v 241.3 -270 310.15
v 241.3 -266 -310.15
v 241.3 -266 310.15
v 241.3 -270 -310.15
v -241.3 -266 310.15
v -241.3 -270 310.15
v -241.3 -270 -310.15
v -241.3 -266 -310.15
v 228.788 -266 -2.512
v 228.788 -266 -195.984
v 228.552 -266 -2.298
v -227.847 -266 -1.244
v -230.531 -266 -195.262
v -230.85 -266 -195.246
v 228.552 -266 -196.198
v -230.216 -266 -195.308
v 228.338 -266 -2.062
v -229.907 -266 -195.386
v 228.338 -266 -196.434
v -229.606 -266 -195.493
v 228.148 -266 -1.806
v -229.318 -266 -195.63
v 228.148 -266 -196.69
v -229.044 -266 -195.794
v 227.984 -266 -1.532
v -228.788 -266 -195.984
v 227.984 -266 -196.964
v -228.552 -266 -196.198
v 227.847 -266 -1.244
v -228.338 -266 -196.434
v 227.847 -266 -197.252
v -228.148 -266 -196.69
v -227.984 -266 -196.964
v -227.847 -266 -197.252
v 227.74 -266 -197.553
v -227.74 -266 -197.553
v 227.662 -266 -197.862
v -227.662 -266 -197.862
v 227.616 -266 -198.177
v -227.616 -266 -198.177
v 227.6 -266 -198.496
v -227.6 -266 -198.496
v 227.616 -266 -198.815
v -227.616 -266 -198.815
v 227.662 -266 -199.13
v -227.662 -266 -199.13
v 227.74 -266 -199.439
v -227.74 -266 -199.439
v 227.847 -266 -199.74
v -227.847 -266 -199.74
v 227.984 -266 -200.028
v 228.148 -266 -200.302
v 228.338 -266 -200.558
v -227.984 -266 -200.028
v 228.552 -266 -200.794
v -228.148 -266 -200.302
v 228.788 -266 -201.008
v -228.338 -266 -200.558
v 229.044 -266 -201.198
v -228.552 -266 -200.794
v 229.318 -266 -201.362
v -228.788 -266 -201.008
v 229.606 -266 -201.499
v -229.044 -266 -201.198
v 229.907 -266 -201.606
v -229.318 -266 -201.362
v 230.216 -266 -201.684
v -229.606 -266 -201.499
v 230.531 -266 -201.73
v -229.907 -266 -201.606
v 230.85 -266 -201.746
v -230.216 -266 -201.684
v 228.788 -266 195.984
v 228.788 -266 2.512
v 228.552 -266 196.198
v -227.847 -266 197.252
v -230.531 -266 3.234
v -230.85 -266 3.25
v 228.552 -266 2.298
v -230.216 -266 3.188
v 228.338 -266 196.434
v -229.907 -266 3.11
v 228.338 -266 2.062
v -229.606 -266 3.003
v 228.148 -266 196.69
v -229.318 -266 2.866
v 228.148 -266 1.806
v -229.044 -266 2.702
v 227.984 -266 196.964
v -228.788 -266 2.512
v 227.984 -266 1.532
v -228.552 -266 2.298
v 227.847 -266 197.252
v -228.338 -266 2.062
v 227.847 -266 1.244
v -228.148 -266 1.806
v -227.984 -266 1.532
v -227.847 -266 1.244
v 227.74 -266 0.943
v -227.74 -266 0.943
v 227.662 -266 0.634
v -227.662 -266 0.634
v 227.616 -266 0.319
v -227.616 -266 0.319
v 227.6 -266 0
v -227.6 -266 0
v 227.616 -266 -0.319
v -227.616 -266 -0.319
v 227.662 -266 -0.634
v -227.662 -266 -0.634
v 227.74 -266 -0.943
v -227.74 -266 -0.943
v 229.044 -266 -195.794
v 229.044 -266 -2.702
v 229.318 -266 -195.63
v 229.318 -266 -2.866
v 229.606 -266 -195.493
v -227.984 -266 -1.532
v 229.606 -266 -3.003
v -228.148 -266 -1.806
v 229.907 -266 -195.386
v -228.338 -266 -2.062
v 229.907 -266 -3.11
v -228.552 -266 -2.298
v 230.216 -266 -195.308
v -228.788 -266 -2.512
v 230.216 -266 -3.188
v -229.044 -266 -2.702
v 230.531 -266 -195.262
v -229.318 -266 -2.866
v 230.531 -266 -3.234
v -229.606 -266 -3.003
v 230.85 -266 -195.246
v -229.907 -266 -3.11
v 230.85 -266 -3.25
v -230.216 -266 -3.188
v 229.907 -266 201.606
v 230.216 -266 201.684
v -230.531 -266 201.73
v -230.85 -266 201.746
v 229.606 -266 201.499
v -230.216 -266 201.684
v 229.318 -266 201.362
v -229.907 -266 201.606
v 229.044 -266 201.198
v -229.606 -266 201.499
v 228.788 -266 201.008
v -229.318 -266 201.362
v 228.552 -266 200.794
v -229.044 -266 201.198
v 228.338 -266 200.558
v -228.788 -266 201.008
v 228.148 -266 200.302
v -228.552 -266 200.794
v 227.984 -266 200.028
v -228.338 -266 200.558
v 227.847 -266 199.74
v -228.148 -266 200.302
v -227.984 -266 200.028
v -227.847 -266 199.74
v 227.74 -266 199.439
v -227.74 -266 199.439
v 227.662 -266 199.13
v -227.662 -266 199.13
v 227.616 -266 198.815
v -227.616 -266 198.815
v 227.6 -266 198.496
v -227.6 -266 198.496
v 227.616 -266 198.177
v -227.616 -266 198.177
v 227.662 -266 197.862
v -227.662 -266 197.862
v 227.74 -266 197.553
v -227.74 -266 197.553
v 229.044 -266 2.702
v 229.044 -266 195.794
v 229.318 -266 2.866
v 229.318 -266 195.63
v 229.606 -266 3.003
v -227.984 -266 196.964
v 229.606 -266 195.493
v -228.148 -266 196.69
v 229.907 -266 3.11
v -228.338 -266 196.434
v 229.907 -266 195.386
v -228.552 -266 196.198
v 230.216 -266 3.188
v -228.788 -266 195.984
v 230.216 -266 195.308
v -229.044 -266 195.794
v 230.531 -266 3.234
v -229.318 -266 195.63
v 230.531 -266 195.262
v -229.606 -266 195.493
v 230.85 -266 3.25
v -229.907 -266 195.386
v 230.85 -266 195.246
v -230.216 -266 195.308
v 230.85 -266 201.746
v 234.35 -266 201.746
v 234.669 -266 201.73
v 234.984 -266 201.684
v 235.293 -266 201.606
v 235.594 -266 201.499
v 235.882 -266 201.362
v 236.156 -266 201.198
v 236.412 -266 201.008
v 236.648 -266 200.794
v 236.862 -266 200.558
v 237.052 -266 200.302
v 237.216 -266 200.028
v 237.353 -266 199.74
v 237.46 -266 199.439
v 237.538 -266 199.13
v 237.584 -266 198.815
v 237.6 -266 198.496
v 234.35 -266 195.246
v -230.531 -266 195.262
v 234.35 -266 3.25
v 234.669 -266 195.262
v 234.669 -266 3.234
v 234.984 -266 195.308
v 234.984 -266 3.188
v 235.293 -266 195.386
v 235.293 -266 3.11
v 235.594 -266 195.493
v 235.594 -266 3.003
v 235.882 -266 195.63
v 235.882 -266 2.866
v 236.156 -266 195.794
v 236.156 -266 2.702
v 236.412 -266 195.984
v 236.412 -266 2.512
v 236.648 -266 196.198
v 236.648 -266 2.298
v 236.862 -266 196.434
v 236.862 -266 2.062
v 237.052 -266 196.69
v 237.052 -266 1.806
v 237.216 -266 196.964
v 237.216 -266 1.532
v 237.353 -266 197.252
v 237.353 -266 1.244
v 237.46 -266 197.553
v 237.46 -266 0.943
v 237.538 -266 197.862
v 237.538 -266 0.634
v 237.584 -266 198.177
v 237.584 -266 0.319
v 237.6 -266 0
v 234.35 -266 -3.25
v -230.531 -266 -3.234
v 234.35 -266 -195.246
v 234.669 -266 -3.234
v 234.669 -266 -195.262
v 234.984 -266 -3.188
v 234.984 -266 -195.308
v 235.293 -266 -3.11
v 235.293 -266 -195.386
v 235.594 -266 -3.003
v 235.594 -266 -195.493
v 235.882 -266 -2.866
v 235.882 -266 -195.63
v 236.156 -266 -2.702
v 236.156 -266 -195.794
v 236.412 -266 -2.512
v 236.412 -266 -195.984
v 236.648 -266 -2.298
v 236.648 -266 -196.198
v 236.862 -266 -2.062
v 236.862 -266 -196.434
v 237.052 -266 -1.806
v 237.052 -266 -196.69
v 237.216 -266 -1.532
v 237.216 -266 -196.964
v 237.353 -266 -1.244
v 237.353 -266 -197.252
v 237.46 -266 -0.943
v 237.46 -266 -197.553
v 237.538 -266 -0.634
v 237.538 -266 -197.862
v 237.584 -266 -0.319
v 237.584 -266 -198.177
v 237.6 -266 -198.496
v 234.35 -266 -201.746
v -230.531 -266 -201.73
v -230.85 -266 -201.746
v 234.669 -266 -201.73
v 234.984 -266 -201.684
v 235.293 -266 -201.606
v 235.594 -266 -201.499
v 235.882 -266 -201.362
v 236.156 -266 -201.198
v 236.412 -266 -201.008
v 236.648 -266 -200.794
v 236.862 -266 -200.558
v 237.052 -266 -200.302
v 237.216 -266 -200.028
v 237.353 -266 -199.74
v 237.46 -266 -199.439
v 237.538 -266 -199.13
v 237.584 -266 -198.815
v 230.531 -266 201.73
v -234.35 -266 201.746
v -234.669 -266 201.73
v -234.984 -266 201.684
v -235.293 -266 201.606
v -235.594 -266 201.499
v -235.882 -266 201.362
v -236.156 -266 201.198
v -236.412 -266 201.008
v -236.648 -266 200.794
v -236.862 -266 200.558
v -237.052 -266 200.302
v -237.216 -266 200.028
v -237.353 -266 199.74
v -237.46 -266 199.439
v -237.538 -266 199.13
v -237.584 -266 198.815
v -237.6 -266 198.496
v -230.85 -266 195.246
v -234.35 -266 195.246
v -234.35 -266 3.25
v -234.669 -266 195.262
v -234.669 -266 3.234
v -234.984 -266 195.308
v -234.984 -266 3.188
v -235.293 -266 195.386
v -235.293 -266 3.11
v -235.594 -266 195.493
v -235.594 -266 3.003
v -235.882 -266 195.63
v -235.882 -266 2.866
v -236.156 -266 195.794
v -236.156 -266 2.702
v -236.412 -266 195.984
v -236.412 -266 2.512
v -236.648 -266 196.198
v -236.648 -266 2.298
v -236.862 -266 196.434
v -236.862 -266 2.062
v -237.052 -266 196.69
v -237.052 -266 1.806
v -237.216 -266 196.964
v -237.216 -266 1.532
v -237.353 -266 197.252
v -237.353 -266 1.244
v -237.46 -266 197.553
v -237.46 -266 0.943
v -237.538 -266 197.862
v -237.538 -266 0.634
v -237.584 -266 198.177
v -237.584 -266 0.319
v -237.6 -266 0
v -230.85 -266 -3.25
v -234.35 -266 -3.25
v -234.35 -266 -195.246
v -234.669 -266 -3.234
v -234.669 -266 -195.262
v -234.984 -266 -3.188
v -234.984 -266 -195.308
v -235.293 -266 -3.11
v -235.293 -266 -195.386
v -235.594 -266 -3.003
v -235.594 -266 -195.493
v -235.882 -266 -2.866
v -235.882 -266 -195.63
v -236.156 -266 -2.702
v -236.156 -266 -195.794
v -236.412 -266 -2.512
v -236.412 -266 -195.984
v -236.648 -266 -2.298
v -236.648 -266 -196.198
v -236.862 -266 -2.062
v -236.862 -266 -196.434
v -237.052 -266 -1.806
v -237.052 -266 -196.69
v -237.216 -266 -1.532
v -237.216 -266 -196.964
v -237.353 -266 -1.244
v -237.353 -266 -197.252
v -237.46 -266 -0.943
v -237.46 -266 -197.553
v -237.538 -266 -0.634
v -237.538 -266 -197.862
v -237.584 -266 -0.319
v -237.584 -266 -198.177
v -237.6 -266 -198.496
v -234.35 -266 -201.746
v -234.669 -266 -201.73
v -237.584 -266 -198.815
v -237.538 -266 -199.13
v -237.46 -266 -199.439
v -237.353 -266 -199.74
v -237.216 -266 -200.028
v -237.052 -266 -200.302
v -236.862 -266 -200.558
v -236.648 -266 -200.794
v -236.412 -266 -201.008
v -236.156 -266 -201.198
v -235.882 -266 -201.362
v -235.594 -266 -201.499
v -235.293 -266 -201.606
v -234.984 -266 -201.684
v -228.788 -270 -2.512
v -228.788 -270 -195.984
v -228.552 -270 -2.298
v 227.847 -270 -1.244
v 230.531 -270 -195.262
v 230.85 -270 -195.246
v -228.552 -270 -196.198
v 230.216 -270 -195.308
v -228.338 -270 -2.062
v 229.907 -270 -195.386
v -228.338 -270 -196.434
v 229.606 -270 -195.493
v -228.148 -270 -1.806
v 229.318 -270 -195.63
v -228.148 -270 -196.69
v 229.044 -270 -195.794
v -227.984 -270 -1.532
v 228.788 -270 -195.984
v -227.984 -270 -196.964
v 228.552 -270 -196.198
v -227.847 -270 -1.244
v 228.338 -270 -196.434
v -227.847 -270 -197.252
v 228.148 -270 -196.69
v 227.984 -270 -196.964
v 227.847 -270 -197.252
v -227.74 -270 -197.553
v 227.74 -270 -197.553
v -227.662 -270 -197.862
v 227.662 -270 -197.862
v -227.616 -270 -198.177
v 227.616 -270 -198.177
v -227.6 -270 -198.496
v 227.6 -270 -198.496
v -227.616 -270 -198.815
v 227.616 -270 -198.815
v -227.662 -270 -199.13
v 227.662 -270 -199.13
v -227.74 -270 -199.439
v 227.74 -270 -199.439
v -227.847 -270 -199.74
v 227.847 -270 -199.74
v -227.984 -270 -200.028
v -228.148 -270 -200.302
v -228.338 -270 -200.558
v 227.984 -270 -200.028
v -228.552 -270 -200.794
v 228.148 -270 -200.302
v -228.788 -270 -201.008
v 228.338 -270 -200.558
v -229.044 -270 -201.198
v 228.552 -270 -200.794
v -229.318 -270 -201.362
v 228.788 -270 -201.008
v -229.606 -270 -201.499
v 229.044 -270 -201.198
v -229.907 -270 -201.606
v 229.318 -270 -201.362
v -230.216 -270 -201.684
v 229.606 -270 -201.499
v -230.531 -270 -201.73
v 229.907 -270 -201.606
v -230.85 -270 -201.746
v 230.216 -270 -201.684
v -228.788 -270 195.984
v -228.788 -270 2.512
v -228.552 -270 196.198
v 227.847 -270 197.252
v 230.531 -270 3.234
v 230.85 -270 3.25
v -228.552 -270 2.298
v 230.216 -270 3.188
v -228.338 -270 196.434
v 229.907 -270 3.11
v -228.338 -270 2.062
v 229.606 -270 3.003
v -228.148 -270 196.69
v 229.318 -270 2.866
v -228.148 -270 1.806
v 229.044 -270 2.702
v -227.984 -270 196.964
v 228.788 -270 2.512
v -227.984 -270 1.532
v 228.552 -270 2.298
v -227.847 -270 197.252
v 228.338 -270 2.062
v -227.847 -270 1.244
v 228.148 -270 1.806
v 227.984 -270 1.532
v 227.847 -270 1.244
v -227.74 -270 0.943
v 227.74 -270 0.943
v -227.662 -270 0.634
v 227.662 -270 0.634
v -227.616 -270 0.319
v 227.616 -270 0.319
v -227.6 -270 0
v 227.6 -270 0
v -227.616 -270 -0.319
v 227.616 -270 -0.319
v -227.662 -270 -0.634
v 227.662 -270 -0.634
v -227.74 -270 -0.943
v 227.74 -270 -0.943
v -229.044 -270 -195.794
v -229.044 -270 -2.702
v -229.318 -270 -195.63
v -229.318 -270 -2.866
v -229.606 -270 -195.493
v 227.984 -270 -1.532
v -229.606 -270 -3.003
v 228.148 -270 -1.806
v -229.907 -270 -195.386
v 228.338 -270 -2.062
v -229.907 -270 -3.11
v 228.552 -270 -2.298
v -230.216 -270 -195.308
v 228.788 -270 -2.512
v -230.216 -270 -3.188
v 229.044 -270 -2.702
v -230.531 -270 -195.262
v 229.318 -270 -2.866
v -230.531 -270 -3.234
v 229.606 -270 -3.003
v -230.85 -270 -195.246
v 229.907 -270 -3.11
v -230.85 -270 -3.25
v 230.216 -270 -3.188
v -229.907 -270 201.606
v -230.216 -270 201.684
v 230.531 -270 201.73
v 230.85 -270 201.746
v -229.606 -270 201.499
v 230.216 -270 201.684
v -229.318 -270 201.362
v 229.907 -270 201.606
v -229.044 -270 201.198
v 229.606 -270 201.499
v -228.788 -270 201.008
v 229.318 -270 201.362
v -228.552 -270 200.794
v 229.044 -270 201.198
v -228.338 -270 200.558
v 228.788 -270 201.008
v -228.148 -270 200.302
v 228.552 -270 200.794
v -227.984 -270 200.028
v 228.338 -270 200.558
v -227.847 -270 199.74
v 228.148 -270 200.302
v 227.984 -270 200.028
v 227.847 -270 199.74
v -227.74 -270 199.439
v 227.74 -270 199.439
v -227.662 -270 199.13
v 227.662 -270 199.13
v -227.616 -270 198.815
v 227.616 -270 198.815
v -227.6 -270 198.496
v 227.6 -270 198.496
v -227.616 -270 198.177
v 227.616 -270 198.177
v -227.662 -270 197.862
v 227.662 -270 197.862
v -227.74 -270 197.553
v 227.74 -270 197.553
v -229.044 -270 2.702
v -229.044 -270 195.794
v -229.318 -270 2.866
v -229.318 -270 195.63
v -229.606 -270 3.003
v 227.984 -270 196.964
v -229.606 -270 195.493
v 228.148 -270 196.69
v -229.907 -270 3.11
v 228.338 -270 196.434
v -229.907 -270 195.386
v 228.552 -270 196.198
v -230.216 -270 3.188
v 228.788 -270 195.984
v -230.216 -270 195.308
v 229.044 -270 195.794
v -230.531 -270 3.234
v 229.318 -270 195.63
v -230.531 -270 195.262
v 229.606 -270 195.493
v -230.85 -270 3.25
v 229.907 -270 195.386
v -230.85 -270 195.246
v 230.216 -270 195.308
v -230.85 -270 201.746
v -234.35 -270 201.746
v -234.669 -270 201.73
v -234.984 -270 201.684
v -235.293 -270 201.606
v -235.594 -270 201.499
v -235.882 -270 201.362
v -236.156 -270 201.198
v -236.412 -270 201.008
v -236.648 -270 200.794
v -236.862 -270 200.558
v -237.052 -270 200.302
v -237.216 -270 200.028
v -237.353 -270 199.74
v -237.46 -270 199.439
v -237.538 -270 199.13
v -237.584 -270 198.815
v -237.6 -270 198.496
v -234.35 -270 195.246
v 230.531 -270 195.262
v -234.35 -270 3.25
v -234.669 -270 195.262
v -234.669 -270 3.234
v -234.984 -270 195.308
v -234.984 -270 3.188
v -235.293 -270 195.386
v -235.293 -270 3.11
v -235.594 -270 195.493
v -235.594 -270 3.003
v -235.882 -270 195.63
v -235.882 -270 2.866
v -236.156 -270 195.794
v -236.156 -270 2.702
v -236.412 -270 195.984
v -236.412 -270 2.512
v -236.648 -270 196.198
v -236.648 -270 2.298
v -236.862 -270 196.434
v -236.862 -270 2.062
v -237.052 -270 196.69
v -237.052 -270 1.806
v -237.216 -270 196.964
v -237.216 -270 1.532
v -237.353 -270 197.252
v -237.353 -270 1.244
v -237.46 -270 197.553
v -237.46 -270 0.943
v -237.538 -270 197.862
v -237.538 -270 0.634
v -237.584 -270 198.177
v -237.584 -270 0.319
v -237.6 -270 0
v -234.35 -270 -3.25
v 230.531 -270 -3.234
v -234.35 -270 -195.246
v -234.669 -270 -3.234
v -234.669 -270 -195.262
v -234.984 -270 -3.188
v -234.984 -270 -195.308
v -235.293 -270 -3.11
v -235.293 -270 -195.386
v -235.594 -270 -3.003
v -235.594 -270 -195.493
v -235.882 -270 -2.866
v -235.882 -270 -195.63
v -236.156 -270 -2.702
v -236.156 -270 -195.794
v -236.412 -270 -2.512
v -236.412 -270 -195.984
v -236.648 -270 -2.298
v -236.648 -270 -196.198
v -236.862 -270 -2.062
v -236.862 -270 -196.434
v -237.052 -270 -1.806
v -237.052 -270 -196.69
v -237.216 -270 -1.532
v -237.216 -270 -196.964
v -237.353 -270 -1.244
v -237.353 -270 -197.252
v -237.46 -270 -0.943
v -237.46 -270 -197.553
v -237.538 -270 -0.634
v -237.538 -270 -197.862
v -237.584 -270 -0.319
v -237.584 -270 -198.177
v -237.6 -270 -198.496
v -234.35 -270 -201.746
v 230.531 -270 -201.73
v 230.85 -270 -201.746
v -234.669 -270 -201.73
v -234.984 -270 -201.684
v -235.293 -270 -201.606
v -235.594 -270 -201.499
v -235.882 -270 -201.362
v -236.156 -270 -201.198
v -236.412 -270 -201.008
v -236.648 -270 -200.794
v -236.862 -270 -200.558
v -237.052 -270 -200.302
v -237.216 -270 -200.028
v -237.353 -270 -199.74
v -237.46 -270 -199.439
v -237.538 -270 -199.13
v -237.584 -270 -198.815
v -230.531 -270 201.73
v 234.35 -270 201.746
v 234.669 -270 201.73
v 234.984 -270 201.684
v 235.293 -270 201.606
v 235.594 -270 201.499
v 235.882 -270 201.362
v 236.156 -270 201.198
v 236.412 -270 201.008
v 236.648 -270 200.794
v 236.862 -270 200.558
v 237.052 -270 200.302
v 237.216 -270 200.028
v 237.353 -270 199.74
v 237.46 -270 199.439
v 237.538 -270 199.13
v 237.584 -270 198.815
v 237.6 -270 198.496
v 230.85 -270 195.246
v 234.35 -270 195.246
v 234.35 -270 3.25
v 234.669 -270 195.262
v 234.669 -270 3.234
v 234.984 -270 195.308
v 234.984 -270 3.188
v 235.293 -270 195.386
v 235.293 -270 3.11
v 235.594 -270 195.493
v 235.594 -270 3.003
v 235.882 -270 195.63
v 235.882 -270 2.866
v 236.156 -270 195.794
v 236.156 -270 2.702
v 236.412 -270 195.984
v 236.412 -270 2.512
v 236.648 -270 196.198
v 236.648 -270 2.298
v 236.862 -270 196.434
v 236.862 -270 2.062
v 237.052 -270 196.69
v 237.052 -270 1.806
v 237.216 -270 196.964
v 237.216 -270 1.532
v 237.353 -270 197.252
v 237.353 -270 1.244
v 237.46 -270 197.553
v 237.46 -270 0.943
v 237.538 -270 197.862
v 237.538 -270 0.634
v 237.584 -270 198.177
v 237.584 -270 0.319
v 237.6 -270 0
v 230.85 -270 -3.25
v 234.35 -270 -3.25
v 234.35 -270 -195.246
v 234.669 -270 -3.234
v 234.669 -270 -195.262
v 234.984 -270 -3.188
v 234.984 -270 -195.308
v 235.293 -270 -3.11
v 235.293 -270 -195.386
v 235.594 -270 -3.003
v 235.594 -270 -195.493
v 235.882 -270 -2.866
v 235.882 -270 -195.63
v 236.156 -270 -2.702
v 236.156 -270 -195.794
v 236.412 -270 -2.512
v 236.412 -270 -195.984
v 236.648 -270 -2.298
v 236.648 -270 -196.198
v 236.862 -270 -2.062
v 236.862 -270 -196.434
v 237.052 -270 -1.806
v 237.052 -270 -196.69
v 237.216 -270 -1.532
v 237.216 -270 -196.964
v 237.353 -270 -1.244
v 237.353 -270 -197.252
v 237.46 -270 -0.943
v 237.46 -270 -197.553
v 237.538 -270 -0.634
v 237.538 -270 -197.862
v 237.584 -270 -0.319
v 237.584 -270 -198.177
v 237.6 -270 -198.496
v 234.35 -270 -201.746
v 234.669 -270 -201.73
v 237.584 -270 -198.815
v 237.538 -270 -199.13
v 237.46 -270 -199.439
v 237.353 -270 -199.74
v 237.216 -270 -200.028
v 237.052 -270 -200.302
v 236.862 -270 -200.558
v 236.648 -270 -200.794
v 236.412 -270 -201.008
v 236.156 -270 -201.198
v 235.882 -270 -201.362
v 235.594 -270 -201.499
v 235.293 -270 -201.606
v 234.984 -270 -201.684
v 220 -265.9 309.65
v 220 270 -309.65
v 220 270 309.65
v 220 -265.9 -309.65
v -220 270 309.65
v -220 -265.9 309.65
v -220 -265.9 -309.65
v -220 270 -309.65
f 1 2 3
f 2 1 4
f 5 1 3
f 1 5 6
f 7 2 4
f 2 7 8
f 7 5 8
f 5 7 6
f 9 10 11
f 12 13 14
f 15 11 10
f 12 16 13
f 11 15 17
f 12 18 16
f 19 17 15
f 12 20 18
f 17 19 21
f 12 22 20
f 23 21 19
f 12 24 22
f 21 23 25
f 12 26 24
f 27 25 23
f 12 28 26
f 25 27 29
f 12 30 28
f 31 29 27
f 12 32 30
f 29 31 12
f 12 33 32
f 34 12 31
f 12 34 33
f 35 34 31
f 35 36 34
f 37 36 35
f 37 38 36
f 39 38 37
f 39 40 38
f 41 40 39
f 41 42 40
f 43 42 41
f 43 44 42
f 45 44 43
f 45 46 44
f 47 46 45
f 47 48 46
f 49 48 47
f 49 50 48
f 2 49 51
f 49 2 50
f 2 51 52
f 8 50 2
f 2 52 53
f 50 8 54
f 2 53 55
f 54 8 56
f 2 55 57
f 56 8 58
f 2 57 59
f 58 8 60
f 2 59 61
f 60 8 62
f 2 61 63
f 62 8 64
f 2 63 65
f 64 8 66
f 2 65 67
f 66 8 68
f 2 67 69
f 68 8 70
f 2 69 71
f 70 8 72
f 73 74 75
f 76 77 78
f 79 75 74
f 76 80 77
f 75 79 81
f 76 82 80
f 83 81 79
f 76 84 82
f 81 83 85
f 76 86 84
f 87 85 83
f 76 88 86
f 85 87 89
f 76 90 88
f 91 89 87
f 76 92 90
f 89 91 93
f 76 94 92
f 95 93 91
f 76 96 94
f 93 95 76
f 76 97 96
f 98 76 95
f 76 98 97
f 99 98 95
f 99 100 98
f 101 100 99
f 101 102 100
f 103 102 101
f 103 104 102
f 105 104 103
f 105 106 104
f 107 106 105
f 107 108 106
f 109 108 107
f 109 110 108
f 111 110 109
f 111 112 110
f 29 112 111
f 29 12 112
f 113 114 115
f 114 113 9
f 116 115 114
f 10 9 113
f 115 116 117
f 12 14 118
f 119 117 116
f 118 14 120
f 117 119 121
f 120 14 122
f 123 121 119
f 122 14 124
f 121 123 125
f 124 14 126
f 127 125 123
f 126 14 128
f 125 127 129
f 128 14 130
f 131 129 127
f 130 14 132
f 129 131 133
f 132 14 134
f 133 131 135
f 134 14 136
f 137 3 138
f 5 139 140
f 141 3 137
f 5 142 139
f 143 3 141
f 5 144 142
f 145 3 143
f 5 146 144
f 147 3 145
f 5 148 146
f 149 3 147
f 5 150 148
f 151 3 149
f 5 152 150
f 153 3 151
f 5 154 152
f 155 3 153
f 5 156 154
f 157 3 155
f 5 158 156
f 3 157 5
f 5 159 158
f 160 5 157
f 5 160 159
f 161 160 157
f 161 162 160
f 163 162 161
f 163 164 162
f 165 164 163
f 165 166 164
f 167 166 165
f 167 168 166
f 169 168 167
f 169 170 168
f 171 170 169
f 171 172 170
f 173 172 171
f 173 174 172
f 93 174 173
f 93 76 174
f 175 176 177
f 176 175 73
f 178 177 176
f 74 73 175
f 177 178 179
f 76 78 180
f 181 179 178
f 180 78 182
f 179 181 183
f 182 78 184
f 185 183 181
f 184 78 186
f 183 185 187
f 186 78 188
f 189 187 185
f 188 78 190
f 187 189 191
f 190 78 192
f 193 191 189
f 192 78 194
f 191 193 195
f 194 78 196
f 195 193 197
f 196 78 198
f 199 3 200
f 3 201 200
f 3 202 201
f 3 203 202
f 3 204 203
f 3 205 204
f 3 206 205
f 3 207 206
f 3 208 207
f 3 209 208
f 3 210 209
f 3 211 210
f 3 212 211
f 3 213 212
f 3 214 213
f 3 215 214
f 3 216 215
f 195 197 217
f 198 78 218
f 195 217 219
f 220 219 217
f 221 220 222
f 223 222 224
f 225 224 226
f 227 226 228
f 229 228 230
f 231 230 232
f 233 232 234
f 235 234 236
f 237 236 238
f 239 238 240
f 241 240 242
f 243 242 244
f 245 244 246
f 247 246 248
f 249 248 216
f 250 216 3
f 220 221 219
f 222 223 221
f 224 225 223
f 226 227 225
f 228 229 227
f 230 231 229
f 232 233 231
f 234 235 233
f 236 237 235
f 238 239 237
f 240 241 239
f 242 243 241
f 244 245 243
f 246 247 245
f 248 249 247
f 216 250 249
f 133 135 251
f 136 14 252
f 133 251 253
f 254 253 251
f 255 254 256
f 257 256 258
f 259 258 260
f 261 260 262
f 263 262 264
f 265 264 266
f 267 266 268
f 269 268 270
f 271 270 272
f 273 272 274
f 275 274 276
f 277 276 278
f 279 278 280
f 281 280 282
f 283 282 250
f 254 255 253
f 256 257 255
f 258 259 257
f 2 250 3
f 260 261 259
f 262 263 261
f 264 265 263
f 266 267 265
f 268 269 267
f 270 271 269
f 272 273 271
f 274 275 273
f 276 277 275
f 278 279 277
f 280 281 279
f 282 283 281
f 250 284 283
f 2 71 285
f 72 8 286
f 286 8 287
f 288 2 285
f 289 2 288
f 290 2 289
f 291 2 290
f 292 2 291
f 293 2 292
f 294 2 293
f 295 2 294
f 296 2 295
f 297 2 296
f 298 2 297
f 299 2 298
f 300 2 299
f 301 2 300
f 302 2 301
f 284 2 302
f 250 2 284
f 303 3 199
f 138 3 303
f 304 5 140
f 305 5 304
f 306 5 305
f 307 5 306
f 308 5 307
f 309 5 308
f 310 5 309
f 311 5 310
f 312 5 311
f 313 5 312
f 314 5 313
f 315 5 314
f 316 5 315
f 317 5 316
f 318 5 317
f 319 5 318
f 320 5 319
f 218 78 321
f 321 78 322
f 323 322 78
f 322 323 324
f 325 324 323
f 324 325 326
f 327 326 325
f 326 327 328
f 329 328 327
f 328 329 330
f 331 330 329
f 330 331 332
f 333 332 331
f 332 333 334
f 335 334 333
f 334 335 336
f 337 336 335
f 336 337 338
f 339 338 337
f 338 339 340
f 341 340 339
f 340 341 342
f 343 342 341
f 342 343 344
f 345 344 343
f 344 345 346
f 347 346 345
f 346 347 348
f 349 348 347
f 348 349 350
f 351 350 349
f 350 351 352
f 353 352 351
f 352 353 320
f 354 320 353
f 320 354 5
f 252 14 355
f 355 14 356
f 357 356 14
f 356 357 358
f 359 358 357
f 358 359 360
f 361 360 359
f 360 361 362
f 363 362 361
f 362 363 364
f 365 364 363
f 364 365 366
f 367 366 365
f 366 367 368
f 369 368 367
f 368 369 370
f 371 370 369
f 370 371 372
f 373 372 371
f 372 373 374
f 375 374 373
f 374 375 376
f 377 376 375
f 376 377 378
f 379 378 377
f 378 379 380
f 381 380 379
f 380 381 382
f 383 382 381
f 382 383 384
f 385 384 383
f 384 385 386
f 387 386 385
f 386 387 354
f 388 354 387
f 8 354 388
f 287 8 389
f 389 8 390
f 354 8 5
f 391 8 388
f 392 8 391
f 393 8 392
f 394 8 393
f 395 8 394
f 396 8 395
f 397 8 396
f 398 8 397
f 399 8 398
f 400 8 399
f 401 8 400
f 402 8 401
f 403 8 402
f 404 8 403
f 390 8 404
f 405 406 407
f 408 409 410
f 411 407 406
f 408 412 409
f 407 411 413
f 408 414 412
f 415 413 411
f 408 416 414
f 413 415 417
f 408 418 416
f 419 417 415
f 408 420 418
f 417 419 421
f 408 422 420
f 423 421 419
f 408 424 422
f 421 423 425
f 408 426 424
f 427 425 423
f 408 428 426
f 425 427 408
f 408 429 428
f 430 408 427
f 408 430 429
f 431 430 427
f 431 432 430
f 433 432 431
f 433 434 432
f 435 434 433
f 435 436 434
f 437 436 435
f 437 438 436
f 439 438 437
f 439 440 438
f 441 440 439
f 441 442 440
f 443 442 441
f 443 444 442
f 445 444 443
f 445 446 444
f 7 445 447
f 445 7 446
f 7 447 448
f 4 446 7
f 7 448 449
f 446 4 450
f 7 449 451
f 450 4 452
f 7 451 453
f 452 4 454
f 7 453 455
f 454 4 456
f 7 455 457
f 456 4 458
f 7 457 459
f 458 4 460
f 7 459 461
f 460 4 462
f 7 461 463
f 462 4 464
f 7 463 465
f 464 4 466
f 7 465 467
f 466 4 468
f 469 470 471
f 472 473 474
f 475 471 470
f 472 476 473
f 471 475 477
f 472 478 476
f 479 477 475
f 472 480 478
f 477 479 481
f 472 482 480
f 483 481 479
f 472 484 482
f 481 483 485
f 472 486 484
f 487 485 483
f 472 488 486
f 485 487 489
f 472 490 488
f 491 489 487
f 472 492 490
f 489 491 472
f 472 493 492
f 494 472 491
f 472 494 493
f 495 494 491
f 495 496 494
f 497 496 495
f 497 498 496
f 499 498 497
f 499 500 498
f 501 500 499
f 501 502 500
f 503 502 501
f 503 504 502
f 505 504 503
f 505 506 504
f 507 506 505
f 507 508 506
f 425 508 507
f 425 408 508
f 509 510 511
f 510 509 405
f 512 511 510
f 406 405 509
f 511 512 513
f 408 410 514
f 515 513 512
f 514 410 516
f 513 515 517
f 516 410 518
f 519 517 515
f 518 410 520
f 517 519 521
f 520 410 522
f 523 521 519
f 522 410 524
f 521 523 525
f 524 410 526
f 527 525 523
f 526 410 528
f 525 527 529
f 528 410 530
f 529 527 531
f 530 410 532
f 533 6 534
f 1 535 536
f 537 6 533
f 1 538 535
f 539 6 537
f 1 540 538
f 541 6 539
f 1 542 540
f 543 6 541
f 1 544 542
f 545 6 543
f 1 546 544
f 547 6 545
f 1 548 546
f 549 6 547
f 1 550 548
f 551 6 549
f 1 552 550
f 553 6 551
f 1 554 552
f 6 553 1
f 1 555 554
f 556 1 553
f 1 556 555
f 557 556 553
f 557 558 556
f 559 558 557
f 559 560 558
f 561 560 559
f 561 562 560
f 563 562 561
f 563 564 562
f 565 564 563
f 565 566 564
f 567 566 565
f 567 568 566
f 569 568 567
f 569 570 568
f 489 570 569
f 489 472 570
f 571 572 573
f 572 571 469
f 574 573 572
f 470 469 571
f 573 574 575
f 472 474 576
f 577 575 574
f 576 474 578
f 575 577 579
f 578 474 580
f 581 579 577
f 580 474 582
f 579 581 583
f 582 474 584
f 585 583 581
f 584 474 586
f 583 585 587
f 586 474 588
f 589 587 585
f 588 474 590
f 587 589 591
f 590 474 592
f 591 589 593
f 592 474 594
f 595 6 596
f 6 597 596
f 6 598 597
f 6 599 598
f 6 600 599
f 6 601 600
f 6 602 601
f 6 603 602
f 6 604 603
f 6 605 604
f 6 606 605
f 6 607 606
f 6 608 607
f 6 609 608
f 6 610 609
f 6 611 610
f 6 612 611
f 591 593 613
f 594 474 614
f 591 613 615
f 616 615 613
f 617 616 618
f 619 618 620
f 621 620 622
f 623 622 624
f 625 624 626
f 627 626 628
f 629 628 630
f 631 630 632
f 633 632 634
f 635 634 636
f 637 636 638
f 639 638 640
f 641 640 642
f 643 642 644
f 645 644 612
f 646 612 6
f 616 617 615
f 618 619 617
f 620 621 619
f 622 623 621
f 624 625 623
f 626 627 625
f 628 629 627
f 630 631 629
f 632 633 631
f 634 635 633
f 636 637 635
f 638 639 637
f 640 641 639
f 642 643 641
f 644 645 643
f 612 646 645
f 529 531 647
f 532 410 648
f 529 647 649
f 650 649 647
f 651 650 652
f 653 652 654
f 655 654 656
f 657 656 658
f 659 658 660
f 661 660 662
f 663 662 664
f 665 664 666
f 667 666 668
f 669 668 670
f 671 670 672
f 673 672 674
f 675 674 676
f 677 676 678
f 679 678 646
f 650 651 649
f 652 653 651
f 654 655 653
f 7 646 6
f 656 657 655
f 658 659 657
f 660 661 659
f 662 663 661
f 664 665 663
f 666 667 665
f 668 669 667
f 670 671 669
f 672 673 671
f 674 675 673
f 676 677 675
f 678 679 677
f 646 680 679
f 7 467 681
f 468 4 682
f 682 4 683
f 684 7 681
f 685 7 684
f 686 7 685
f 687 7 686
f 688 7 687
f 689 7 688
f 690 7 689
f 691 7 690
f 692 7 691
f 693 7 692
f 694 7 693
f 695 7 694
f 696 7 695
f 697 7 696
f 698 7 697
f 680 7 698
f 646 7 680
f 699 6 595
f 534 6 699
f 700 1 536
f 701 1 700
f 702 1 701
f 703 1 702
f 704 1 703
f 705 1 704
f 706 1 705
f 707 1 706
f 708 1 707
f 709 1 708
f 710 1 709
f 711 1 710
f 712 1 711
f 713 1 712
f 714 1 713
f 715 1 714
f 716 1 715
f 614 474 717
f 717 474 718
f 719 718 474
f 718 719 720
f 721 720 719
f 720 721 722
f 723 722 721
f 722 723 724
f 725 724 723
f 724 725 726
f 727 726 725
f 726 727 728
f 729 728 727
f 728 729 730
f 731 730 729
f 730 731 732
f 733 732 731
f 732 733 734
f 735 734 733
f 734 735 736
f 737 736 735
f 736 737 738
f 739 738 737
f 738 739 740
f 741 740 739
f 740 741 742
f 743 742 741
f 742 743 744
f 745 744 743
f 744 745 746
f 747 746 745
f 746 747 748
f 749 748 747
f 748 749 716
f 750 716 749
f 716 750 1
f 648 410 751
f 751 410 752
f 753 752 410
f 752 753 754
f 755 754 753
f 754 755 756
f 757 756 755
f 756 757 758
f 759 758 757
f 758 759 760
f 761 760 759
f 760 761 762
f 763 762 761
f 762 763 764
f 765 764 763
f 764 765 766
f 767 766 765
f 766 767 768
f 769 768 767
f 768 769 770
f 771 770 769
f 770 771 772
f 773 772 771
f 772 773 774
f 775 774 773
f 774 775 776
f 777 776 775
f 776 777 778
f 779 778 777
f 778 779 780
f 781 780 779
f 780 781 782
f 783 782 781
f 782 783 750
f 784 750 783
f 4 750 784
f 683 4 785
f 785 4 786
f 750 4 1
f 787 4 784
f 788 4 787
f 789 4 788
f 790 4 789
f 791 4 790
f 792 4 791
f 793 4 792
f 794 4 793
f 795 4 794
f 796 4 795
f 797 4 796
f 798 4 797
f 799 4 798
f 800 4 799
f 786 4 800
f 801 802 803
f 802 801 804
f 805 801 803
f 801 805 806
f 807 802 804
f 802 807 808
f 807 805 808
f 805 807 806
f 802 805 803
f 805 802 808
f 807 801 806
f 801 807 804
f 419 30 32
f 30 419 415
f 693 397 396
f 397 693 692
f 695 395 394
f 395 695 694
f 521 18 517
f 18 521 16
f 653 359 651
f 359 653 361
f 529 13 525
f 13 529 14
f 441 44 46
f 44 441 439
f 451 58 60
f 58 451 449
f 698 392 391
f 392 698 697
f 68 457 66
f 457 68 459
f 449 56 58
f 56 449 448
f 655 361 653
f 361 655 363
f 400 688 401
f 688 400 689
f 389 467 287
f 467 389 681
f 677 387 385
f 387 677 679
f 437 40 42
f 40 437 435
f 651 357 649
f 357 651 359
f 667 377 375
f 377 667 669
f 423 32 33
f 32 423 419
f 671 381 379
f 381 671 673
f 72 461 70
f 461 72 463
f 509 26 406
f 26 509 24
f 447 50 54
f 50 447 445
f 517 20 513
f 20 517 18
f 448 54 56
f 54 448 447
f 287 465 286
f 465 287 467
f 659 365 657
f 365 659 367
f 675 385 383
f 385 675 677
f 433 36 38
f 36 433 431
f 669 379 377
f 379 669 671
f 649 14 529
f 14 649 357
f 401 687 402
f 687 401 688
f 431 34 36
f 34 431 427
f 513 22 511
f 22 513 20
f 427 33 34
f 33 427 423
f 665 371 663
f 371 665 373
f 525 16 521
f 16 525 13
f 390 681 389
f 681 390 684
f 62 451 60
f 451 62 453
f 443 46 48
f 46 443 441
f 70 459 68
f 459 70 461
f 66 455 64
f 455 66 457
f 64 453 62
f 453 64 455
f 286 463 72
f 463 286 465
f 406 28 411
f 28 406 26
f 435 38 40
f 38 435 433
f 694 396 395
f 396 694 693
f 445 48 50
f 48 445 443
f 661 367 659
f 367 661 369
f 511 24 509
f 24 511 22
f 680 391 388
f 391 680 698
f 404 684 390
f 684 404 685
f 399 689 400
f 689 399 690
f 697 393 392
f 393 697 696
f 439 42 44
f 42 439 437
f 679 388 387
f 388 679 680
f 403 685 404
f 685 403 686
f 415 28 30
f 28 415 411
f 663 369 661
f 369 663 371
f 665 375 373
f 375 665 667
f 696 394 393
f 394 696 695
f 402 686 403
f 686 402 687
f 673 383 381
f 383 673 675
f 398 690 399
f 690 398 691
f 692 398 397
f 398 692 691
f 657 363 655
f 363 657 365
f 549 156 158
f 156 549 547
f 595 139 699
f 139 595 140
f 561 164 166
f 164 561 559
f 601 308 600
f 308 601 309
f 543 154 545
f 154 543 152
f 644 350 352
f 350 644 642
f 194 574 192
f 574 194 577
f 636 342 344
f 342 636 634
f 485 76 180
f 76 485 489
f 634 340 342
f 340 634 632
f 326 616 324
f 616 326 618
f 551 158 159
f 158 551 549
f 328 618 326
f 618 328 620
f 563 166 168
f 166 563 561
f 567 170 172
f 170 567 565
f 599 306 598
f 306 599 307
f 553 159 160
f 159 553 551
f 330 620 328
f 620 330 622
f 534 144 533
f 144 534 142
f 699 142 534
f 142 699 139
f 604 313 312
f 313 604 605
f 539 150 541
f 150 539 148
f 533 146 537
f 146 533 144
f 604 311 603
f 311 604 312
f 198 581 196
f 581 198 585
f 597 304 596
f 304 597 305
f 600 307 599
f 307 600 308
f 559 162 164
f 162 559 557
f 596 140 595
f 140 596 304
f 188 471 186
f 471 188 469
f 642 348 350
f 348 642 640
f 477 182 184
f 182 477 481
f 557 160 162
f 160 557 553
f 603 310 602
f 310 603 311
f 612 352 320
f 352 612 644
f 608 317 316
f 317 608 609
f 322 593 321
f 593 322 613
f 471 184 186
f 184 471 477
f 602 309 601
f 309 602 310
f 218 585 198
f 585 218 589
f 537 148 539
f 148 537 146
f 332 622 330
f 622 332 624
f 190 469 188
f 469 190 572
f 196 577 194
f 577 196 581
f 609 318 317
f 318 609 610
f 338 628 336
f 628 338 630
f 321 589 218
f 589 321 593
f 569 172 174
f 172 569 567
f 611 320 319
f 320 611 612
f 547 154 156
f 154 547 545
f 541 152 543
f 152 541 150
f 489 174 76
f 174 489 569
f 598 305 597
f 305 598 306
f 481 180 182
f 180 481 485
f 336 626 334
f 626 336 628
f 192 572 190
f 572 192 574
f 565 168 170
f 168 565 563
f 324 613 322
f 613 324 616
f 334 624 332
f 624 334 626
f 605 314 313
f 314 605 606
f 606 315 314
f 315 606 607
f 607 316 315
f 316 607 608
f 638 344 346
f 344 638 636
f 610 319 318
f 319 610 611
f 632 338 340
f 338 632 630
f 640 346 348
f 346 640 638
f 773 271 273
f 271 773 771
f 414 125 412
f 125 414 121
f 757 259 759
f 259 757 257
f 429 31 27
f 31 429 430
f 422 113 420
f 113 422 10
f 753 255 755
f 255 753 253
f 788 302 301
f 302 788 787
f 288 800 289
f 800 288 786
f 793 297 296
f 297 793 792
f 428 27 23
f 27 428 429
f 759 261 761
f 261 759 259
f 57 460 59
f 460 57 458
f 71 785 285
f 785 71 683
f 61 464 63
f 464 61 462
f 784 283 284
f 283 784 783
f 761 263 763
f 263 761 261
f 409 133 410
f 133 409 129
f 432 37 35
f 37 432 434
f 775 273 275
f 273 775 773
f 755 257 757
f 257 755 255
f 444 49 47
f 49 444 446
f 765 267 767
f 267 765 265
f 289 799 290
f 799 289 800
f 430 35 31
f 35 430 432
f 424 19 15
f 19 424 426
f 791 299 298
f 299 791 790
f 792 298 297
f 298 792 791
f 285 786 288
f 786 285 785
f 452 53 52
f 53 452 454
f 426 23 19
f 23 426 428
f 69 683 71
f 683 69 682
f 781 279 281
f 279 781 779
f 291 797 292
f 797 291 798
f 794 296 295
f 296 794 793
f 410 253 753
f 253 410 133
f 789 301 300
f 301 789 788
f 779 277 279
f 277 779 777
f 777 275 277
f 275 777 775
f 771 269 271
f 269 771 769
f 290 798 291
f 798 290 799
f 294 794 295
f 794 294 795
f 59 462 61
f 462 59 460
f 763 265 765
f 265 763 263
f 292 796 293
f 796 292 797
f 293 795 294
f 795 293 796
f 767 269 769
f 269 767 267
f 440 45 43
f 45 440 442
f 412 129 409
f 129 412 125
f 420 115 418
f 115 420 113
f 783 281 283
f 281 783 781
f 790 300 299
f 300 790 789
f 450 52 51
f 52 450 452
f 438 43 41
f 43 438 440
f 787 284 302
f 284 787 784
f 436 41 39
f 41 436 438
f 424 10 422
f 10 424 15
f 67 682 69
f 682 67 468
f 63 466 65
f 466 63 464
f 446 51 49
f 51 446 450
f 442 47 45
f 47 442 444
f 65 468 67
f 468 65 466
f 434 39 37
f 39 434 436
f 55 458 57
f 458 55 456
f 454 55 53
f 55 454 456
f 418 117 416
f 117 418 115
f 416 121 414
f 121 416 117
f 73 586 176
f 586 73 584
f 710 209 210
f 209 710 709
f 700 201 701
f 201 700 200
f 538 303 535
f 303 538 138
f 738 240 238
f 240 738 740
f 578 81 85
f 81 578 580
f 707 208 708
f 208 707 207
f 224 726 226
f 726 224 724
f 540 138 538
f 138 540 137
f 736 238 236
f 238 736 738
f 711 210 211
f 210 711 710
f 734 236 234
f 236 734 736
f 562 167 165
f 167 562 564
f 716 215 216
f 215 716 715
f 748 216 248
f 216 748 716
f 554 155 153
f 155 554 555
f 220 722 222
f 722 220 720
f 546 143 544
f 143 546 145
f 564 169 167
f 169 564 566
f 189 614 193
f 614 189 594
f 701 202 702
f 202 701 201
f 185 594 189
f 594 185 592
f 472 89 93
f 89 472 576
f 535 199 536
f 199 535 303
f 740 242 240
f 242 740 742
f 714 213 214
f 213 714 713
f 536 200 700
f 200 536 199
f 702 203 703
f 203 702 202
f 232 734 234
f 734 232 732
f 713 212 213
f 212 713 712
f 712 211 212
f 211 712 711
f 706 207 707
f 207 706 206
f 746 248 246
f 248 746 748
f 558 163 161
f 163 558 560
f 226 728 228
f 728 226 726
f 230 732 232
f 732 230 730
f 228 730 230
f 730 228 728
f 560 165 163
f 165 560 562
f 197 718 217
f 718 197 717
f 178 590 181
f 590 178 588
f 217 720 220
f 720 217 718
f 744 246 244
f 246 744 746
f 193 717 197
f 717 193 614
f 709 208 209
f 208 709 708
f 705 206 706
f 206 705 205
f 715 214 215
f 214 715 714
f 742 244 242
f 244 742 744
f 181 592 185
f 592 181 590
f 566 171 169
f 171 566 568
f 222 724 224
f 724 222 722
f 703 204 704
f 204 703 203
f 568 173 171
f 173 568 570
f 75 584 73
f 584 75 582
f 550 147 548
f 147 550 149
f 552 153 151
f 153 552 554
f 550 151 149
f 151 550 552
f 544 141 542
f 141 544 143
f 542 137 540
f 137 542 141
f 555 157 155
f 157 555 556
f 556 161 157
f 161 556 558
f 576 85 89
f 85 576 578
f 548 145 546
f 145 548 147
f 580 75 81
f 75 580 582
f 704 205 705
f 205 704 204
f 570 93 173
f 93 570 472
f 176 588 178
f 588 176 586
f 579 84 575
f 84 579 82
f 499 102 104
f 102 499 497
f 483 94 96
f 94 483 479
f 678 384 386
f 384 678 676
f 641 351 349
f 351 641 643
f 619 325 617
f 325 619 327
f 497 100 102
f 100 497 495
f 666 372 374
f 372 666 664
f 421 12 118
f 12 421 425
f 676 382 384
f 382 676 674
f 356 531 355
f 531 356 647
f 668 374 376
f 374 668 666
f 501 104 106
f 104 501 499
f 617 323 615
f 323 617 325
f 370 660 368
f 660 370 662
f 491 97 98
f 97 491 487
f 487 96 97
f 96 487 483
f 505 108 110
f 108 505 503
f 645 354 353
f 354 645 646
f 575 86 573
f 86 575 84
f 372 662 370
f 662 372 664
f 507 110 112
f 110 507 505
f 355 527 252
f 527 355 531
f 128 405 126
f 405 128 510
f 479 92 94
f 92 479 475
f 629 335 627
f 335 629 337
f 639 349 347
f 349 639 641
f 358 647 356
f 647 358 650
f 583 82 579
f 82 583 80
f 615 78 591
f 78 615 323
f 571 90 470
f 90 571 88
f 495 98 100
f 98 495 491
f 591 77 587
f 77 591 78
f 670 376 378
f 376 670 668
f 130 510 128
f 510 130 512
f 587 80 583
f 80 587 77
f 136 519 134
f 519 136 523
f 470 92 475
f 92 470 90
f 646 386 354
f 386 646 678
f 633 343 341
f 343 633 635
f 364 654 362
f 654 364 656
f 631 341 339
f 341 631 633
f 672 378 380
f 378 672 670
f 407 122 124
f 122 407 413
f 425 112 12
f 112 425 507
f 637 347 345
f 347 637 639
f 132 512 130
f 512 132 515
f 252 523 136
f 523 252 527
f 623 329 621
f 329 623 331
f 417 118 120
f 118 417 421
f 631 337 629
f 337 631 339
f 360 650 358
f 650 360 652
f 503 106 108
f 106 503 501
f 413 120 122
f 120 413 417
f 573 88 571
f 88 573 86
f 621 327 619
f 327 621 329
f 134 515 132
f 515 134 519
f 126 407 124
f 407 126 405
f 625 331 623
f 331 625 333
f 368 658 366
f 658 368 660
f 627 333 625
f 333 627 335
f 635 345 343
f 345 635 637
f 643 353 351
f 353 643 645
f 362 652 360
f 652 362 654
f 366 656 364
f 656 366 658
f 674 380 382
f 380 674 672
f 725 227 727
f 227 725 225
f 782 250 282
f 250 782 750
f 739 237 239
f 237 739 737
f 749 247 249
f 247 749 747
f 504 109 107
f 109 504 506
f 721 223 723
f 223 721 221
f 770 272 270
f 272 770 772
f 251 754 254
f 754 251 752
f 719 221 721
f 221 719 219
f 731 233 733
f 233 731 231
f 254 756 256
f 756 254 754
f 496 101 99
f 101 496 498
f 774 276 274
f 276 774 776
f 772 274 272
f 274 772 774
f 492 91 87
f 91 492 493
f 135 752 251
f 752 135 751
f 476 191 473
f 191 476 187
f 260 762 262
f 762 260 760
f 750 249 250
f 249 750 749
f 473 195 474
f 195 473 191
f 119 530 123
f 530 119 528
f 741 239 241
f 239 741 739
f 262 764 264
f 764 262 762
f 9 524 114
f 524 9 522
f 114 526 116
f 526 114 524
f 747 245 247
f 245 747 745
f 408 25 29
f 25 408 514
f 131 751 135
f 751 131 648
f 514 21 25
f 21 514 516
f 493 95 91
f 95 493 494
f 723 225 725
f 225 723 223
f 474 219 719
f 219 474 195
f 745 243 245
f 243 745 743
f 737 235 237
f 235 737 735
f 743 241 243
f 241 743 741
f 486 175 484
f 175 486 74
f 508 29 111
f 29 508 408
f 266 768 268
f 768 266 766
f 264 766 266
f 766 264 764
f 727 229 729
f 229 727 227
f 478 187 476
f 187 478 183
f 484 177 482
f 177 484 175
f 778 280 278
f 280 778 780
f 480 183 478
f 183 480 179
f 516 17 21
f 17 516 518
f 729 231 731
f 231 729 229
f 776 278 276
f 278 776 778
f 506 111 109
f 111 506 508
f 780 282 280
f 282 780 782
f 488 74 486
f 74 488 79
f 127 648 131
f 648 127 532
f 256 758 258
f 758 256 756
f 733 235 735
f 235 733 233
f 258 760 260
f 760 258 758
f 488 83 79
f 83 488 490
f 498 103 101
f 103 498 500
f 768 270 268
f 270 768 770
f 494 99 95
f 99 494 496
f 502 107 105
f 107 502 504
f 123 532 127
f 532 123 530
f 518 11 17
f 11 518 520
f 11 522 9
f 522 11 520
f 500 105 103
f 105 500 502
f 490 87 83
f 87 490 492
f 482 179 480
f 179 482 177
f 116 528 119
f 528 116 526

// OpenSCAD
// ============================================================================
// Atom Lithography Machine — Parametric OpenSCAD Module (S6.6-06)
// ============================================================================
// part_id           : S6.6-06
// parent_bom_id     : S6.6
// subsystem         : S6
// part_name         : RFSoC cogullamali sayisallastirici / AWG kartlari (AMD ZCU216, 14 kart = 56/4)
// material          : Al 6061
// temp_stage        : 300 K (kabin)
// vacuum_grade      : Atmosfer
// tolerance         : 14-bit ADC/DAC
// computed_mass_kg  : 48.41227
// envelope_mm       : 482.600 x 552.050 x 620.300
// design_maturity   : M0_M1_DETAILED_CAD_DESIGN_ONLY
// no_lab_measurement: true
// iec61508_certified: false
// semi_s2_certified : false
// Units: millimeters (mm)
// ============================================================================

$fn = 64;

// Nominal bounding envelope parameters (mm)
bbox_x = 482.6000;
bbox_y = 552.0500;
bbox_z = 620.3000;

// Part-specific parametric dimensions
rack_u = 14;
u_start = 25;
n_zcu216_cards = 14;
n_2u_enclosures = 7;

// Interface / port parameters (mm)

module part_S6_6_06() {
  difference() {
    union() {
      // 19" EIA-310 front bezel panel
      translate([0.000, -268.000, 0.000]) cube([482.600, 4.000, 620.300], center=true);
      // Hollow EMI shielded chassis body
      translate([0.000, 2.050, 0.000]) cube([440.000, 535.900, 619.300], center=true);
    }
    // EIA-310 rack ear slot
    translate([-232.600, -268.000, -198.496]) rotate([90.000, 0.000, 0.000]) {
      hull() {
        translate([-1.750, 0, 0]) cylinder(d=6.500, h=6.000, center=true);
        translate([1.750, 0, 0]) cylinder(d=6.500, h=6.000, center=true);
      }
    }
    // EIA-310 rack ear slot
    translate([-232.600, -268.000, 198.496]) rotate([90.000, 0.000, 0.000]) {
      hull() {
        translate([-1.750, 0, 0]) cylinder(d=6.500, h=6.000, center=true);
        translate([1.750, 0, 0]) cylinder(d=6.500, h=6.000, center=true);
      }
    }
    // EIA-310 rack ear slot
    translate([232.600, -268.000, -198.496]) rotate([90.000, 0.000, 0.000]) {
      hull() {
        translate([-1.750, 0, 0]) cylinder(d=6.500, h=6.000, center=true);
        translate([1.750, 0, 0]) cylinder(d=6.500, h=6.000, center=true);
      }
    }
    // EIA-310 rack ear slot
    translate([232.600, -268.000, 198.496]) rotate([90.000, 0.000, 0.000]) {
      hull() {
        translate([-1.750, 0, 0]) cylinder(d=6.500, h=6.000, center=true);
        translate([1.750, 0, 0]) cylinder(d=6.500, h=6.000, center=true);
      }
    }
    // EIA-310 rack ear slot
    translate([-232.600, -268.000, 0.000]) rotate([90.000, 0.000, 0.000]) {
      hull() {
        translate([-1.750, 0, 0]) cylinder(d=6.500, h=6.000, center=true);
        translate([1.750, 0, 0]) cylinder(d=6.500, h=6.000, center=true);
      }
    }
    // EIA-310 rack ear slot
    translate([232.600, -268.000, 0.000]) rotate([90.000, 0.000, 0.000]) {
      hull() {
        translate([-1.750, 0, 0]) cylinder(d=6.500, h=6.000, center=true);
        translate([1.750, 0, 0]) cylinder(d=6.500, h=6.000, center=true);
      }
    }
  }
}

// World assembly mounting transform (global machine frame, mm / deg):
// translate([2100.000, 0.000, 1467.950]) rotate([0.000, 0.000, 0.000]) part_S6_6_06();

part_S6_6_06();
